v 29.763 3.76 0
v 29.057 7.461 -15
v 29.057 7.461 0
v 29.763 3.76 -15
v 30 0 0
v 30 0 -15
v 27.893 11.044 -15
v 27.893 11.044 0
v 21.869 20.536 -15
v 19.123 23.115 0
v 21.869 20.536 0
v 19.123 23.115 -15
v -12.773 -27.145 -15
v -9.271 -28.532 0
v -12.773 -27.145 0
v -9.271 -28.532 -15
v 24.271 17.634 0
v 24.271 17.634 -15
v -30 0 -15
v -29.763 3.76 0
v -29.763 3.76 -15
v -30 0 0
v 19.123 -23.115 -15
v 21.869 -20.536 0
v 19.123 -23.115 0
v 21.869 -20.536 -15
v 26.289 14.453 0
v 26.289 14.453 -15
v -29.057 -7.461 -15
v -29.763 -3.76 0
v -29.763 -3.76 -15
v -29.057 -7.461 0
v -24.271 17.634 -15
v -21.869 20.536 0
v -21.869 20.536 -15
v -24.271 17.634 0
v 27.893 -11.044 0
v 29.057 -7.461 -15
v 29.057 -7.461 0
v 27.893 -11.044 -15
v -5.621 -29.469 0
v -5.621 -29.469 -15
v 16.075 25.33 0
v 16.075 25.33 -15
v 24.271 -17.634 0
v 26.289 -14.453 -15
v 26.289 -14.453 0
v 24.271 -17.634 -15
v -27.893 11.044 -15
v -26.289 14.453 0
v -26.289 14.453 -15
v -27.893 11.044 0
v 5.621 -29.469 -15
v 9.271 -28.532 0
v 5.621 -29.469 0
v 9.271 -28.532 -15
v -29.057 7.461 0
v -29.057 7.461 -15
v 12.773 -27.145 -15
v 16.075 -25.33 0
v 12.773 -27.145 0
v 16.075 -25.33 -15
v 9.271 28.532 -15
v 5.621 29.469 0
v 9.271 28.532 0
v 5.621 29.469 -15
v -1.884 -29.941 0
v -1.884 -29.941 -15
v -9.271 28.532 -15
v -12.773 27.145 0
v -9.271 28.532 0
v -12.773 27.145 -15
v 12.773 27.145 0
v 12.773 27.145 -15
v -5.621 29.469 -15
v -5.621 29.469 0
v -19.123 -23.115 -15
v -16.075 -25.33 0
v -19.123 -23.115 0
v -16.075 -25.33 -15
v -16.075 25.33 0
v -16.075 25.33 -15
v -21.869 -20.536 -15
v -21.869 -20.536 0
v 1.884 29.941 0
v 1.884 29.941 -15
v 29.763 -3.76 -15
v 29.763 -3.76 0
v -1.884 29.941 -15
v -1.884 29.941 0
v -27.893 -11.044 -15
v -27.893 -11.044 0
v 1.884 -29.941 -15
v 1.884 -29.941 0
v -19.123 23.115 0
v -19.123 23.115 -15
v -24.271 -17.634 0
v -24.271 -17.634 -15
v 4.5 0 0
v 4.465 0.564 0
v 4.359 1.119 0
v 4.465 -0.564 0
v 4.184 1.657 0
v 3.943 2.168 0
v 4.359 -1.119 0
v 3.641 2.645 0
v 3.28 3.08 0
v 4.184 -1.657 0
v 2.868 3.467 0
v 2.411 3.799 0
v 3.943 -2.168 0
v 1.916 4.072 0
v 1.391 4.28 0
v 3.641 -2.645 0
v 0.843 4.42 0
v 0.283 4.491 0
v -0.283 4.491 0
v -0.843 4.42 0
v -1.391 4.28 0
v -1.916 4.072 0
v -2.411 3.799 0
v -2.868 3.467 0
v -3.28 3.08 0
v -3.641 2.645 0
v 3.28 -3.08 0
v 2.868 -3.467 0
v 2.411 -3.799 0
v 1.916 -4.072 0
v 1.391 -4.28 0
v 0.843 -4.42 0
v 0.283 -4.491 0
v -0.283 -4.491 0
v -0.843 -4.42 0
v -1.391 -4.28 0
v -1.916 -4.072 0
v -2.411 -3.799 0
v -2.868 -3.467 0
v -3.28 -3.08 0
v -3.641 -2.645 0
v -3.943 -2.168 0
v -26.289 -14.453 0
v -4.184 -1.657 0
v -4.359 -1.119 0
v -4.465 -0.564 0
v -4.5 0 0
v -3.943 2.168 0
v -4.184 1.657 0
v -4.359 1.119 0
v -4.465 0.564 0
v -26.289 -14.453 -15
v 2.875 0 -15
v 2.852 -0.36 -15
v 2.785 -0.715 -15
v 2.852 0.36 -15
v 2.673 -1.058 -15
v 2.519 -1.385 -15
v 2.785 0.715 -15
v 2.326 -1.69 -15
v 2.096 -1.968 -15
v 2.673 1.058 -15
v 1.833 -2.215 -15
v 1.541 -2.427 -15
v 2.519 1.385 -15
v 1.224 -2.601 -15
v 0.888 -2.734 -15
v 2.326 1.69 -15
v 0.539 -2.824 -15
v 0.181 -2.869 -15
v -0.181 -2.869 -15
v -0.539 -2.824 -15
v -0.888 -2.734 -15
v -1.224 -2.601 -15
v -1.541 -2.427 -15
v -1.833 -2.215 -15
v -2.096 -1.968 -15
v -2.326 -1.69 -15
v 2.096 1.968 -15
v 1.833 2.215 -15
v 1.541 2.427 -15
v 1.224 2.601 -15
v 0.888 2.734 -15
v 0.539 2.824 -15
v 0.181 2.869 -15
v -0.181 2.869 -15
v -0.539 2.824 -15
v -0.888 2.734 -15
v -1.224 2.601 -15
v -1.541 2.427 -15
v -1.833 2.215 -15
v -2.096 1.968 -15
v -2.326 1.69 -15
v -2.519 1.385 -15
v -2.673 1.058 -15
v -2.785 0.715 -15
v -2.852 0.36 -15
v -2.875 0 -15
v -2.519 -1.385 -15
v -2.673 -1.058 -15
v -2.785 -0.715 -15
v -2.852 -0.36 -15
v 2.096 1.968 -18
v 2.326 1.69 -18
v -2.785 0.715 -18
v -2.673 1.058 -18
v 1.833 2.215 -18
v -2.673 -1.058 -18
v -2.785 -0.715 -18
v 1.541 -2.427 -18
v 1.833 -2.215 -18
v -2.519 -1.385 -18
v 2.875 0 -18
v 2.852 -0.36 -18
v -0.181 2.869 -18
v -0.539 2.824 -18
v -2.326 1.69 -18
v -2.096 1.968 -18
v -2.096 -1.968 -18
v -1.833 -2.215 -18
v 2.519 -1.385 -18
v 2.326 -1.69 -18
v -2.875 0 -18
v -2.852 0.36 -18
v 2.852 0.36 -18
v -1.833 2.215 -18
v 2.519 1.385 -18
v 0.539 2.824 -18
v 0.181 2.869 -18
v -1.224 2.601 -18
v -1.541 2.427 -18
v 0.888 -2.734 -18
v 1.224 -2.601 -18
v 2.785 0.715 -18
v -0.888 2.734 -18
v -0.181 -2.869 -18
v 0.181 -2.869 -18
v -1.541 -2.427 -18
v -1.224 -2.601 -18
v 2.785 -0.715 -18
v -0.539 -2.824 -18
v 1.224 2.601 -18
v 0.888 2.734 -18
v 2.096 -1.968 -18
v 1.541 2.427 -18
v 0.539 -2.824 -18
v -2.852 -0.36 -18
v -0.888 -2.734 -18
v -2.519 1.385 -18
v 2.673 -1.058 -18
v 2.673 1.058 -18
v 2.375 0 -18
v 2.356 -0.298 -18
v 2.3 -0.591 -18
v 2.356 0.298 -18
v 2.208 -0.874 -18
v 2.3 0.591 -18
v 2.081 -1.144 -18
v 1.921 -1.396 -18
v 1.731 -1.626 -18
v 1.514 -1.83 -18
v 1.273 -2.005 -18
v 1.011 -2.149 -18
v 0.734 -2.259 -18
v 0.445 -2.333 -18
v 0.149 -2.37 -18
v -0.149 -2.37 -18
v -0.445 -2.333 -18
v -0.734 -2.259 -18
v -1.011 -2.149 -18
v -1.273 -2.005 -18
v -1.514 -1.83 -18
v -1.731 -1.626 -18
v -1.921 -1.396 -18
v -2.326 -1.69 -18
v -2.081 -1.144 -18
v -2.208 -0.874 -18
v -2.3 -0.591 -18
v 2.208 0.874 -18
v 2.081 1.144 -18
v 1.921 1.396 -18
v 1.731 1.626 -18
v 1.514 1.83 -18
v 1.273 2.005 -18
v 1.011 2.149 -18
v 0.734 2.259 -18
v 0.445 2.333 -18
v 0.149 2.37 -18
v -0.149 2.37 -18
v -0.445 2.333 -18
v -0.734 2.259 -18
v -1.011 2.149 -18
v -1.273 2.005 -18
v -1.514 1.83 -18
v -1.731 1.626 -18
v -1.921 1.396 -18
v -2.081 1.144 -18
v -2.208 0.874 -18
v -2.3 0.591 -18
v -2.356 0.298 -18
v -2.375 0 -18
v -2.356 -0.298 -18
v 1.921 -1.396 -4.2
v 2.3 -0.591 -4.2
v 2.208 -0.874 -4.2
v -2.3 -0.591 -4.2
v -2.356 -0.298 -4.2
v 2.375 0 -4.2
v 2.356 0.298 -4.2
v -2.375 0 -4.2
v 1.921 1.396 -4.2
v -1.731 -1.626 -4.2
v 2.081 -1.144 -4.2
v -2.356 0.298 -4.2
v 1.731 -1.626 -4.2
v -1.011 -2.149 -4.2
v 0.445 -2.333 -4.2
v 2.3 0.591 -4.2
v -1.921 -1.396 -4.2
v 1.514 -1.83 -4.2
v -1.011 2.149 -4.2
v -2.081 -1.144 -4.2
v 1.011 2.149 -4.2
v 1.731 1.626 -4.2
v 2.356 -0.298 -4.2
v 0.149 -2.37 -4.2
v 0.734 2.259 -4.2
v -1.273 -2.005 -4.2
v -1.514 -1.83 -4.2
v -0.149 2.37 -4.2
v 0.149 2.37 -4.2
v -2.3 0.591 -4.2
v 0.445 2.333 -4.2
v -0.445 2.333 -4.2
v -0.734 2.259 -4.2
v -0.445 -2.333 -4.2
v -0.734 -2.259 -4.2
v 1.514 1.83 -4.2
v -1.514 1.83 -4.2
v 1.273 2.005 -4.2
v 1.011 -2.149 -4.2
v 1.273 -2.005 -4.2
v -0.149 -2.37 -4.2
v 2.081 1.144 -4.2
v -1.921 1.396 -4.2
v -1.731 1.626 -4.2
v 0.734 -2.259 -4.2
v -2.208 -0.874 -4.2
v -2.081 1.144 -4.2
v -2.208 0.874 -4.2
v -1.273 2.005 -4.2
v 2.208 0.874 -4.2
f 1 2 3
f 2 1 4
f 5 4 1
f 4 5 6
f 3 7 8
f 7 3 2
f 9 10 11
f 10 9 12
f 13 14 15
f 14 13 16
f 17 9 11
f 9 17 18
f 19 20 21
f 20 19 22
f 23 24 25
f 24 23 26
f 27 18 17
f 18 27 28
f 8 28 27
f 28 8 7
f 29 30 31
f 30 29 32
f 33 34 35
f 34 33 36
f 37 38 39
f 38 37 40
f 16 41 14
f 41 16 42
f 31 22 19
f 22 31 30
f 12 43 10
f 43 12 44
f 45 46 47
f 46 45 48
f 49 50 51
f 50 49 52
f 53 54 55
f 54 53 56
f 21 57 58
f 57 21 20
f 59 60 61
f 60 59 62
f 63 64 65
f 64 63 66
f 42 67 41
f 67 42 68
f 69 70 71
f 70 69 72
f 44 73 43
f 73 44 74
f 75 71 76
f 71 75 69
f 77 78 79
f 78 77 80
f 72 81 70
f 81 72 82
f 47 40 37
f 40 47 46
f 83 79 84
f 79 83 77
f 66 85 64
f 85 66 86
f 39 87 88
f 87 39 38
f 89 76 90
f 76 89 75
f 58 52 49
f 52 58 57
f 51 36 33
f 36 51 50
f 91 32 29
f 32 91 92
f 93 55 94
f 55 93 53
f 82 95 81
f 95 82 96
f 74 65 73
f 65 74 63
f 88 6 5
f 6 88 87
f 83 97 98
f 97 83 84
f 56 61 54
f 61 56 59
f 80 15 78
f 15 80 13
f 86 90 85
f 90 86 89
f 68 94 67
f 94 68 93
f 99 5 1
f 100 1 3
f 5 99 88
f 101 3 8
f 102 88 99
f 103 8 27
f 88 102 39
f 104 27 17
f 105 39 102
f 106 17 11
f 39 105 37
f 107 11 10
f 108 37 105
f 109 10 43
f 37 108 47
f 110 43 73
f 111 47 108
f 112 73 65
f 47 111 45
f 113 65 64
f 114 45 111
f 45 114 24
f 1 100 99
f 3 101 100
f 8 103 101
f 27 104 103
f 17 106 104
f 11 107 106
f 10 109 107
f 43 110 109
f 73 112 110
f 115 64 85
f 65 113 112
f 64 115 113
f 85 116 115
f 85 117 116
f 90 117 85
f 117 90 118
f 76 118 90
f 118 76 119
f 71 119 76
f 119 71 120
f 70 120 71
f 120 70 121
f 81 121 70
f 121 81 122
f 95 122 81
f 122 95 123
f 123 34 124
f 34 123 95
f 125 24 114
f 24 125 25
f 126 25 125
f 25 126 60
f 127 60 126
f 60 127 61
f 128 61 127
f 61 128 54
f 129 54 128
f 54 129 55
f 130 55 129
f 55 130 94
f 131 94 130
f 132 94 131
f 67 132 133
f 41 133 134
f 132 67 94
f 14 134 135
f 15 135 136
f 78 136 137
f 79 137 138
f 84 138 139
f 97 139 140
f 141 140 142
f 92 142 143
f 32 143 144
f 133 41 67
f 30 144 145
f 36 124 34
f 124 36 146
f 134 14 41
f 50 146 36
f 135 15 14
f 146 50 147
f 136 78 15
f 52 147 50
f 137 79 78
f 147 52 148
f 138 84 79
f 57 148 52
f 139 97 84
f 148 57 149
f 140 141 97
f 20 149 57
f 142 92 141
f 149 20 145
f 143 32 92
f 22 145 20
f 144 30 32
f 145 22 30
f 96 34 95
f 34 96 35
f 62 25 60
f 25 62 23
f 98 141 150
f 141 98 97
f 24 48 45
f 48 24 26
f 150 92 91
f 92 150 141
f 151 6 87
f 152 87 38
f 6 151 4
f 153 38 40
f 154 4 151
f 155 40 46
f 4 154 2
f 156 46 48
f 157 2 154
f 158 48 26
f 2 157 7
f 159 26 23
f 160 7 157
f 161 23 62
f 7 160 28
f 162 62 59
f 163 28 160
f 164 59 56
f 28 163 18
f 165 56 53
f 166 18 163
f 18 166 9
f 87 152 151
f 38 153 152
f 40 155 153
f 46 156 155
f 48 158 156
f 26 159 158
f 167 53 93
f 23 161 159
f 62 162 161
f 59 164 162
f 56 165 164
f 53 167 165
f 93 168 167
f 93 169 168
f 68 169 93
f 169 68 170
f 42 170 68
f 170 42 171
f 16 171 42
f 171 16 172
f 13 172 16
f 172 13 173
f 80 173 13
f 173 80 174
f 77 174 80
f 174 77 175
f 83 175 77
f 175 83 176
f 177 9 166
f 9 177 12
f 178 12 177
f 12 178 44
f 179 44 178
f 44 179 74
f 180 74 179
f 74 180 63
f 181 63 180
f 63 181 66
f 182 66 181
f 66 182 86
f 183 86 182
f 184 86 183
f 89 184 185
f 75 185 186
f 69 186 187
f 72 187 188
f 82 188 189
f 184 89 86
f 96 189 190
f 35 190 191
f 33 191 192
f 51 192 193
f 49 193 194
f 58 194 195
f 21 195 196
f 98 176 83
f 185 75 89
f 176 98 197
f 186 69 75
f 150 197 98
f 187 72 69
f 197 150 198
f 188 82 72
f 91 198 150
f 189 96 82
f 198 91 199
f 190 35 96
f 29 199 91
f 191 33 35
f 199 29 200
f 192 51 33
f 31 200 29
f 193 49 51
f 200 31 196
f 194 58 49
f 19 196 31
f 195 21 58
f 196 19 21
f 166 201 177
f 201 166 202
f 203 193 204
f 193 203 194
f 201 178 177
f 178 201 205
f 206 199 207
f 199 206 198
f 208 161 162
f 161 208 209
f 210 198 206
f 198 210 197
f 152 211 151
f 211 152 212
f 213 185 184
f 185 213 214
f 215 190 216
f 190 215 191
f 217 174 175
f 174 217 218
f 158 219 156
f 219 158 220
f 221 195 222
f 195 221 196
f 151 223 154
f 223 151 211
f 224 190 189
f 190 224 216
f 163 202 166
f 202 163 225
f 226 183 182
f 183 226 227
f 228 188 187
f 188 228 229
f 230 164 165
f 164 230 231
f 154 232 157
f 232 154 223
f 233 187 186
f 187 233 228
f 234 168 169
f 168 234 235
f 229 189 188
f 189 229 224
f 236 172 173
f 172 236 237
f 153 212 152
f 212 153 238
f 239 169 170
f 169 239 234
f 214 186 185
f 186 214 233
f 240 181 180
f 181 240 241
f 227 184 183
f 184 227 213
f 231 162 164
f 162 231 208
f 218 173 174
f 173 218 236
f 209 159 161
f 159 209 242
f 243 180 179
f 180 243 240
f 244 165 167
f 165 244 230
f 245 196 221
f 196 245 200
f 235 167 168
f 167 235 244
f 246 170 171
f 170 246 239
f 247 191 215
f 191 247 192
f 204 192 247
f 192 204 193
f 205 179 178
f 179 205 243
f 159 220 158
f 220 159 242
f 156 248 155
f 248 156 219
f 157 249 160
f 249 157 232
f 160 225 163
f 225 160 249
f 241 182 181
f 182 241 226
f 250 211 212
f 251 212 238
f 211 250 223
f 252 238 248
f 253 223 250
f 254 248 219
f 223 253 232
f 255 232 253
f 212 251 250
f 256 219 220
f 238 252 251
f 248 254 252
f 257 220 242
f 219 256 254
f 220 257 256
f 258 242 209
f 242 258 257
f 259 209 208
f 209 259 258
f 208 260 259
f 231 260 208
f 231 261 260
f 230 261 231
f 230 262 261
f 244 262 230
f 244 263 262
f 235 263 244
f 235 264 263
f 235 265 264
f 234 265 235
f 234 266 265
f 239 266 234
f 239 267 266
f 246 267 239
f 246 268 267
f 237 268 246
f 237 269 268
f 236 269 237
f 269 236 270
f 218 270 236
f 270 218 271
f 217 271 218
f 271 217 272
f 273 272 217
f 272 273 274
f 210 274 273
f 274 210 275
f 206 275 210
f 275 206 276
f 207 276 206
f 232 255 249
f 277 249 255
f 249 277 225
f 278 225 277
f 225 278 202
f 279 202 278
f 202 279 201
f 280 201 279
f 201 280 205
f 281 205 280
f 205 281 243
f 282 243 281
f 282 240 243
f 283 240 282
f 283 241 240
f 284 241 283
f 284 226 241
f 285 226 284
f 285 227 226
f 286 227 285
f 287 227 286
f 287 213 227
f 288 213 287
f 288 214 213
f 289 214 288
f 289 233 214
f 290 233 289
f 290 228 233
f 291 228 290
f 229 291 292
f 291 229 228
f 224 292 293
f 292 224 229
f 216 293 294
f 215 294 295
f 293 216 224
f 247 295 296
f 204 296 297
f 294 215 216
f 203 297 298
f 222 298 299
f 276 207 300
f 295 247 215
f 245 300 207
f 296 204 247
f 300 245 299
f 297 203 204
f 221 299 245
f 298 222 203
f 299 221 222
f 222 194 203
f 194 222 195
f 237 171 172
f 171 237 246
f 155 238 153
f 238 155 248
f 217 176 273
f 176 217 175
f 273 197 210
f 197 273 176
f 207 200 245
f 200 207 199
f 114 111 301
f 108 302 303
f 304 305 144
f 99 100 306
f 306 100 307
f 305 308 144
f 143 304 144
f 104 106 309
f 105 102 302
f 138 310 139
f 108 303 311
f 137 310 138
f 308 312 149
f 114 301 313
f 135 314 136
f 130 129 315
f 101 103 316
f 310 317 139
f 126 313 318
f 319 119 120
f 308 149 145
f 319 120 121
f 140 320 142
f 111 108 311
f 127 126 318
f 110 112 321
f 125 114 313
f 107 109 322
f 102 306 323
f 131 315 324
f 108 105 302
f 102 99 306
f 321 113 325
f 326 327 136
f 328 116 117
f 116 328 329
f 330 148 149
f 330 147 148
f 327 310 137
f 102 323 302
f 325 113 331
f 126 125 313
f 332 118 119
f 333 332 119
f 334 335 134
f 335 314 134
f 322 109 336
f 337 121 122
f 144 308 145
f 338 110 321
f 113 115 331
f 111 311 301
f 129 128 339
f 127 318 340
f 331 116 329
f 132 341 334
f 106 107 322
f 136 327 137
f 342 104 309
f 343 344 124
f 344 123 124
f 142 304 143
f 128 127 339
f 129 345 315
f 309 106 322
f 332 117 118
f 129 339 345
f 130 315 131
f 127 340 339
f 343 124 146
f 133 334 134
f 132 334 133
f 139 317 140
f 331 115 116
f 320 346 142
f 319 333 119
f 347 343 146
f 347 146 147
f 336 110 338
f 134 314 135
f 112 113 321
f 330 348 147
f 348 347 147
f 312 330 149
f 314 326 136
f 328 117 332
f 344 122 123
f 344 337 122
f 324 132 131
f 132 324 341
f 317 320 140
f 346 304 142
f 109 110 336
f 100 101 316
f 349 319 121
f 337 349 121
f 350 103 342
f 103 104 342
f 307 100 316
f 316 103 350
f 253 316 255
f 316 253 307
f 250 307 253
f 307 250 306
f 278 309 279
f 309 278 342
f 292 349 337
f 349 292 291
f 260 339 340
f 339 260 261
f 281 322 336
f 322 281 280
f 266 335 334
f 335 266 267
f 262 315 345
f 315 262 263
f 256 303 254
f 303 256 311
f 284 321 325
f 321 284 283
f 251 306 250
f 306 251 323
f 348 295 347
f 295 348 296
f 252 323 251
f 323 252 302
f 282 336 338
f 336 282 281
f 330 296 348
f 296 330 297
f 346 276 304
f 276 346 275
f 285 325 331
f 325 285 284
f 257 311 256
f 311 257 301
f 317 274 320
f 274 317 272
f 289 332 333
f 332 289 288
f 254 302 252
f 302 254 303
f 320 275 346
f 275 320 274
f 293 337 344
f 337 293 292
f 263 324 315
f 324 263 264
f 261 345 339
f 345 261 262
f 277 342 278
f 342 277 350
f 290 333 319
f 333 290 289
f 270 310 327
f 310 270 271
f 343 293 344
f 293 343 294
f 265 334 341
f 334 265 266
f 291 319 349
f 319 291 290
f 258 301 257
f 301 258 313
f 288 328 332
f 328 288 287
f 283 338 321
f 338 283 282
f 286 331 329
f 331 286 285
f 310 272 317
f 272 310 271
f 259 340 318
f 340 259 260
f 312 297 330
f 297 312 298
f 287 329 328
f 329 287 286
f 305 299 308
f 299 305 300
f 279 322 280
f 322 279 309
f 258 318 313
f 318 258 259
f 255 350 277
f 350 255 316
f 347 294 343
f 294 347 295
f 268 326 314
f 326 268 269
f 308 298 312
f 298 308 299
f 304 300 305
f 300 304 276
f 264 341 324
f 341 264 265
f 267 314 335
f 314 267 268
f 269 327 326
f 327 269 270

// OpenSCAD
$fn = 50;

difference() {
	union() {
		translate(v = [0, 0, -15.0]) {
			cylinder(h = 15, r = 30.0);
		}
		#translate(v = [0, 0, -18.0]) {
			cylinder(h = 18, r = 2.875);
		}
	}
	union() {
		translate(v = [0, 0, 0]) {
			rotate(a = [0, 0, 0]) {
				difference() {
					union() {
						translate(v = [0, 0, -18.0]) {
							cylinder(h = 18, r = 2.25);
						}
						translate(v = [0, 0, -4.2]) {
							cylinder(h = 4.2, r1 = 2.375, r2 = 4.5);
						}
						translate(v = [0, 0, -18.0]) {
							cylinder(h = 18, r = 2.375);
						}
						translate(v = [0, 0, -18.0]) {
							cylinder(h = 18, r = 2.25);
						}
					}
					union();
				}
			}
		}
	}
}
